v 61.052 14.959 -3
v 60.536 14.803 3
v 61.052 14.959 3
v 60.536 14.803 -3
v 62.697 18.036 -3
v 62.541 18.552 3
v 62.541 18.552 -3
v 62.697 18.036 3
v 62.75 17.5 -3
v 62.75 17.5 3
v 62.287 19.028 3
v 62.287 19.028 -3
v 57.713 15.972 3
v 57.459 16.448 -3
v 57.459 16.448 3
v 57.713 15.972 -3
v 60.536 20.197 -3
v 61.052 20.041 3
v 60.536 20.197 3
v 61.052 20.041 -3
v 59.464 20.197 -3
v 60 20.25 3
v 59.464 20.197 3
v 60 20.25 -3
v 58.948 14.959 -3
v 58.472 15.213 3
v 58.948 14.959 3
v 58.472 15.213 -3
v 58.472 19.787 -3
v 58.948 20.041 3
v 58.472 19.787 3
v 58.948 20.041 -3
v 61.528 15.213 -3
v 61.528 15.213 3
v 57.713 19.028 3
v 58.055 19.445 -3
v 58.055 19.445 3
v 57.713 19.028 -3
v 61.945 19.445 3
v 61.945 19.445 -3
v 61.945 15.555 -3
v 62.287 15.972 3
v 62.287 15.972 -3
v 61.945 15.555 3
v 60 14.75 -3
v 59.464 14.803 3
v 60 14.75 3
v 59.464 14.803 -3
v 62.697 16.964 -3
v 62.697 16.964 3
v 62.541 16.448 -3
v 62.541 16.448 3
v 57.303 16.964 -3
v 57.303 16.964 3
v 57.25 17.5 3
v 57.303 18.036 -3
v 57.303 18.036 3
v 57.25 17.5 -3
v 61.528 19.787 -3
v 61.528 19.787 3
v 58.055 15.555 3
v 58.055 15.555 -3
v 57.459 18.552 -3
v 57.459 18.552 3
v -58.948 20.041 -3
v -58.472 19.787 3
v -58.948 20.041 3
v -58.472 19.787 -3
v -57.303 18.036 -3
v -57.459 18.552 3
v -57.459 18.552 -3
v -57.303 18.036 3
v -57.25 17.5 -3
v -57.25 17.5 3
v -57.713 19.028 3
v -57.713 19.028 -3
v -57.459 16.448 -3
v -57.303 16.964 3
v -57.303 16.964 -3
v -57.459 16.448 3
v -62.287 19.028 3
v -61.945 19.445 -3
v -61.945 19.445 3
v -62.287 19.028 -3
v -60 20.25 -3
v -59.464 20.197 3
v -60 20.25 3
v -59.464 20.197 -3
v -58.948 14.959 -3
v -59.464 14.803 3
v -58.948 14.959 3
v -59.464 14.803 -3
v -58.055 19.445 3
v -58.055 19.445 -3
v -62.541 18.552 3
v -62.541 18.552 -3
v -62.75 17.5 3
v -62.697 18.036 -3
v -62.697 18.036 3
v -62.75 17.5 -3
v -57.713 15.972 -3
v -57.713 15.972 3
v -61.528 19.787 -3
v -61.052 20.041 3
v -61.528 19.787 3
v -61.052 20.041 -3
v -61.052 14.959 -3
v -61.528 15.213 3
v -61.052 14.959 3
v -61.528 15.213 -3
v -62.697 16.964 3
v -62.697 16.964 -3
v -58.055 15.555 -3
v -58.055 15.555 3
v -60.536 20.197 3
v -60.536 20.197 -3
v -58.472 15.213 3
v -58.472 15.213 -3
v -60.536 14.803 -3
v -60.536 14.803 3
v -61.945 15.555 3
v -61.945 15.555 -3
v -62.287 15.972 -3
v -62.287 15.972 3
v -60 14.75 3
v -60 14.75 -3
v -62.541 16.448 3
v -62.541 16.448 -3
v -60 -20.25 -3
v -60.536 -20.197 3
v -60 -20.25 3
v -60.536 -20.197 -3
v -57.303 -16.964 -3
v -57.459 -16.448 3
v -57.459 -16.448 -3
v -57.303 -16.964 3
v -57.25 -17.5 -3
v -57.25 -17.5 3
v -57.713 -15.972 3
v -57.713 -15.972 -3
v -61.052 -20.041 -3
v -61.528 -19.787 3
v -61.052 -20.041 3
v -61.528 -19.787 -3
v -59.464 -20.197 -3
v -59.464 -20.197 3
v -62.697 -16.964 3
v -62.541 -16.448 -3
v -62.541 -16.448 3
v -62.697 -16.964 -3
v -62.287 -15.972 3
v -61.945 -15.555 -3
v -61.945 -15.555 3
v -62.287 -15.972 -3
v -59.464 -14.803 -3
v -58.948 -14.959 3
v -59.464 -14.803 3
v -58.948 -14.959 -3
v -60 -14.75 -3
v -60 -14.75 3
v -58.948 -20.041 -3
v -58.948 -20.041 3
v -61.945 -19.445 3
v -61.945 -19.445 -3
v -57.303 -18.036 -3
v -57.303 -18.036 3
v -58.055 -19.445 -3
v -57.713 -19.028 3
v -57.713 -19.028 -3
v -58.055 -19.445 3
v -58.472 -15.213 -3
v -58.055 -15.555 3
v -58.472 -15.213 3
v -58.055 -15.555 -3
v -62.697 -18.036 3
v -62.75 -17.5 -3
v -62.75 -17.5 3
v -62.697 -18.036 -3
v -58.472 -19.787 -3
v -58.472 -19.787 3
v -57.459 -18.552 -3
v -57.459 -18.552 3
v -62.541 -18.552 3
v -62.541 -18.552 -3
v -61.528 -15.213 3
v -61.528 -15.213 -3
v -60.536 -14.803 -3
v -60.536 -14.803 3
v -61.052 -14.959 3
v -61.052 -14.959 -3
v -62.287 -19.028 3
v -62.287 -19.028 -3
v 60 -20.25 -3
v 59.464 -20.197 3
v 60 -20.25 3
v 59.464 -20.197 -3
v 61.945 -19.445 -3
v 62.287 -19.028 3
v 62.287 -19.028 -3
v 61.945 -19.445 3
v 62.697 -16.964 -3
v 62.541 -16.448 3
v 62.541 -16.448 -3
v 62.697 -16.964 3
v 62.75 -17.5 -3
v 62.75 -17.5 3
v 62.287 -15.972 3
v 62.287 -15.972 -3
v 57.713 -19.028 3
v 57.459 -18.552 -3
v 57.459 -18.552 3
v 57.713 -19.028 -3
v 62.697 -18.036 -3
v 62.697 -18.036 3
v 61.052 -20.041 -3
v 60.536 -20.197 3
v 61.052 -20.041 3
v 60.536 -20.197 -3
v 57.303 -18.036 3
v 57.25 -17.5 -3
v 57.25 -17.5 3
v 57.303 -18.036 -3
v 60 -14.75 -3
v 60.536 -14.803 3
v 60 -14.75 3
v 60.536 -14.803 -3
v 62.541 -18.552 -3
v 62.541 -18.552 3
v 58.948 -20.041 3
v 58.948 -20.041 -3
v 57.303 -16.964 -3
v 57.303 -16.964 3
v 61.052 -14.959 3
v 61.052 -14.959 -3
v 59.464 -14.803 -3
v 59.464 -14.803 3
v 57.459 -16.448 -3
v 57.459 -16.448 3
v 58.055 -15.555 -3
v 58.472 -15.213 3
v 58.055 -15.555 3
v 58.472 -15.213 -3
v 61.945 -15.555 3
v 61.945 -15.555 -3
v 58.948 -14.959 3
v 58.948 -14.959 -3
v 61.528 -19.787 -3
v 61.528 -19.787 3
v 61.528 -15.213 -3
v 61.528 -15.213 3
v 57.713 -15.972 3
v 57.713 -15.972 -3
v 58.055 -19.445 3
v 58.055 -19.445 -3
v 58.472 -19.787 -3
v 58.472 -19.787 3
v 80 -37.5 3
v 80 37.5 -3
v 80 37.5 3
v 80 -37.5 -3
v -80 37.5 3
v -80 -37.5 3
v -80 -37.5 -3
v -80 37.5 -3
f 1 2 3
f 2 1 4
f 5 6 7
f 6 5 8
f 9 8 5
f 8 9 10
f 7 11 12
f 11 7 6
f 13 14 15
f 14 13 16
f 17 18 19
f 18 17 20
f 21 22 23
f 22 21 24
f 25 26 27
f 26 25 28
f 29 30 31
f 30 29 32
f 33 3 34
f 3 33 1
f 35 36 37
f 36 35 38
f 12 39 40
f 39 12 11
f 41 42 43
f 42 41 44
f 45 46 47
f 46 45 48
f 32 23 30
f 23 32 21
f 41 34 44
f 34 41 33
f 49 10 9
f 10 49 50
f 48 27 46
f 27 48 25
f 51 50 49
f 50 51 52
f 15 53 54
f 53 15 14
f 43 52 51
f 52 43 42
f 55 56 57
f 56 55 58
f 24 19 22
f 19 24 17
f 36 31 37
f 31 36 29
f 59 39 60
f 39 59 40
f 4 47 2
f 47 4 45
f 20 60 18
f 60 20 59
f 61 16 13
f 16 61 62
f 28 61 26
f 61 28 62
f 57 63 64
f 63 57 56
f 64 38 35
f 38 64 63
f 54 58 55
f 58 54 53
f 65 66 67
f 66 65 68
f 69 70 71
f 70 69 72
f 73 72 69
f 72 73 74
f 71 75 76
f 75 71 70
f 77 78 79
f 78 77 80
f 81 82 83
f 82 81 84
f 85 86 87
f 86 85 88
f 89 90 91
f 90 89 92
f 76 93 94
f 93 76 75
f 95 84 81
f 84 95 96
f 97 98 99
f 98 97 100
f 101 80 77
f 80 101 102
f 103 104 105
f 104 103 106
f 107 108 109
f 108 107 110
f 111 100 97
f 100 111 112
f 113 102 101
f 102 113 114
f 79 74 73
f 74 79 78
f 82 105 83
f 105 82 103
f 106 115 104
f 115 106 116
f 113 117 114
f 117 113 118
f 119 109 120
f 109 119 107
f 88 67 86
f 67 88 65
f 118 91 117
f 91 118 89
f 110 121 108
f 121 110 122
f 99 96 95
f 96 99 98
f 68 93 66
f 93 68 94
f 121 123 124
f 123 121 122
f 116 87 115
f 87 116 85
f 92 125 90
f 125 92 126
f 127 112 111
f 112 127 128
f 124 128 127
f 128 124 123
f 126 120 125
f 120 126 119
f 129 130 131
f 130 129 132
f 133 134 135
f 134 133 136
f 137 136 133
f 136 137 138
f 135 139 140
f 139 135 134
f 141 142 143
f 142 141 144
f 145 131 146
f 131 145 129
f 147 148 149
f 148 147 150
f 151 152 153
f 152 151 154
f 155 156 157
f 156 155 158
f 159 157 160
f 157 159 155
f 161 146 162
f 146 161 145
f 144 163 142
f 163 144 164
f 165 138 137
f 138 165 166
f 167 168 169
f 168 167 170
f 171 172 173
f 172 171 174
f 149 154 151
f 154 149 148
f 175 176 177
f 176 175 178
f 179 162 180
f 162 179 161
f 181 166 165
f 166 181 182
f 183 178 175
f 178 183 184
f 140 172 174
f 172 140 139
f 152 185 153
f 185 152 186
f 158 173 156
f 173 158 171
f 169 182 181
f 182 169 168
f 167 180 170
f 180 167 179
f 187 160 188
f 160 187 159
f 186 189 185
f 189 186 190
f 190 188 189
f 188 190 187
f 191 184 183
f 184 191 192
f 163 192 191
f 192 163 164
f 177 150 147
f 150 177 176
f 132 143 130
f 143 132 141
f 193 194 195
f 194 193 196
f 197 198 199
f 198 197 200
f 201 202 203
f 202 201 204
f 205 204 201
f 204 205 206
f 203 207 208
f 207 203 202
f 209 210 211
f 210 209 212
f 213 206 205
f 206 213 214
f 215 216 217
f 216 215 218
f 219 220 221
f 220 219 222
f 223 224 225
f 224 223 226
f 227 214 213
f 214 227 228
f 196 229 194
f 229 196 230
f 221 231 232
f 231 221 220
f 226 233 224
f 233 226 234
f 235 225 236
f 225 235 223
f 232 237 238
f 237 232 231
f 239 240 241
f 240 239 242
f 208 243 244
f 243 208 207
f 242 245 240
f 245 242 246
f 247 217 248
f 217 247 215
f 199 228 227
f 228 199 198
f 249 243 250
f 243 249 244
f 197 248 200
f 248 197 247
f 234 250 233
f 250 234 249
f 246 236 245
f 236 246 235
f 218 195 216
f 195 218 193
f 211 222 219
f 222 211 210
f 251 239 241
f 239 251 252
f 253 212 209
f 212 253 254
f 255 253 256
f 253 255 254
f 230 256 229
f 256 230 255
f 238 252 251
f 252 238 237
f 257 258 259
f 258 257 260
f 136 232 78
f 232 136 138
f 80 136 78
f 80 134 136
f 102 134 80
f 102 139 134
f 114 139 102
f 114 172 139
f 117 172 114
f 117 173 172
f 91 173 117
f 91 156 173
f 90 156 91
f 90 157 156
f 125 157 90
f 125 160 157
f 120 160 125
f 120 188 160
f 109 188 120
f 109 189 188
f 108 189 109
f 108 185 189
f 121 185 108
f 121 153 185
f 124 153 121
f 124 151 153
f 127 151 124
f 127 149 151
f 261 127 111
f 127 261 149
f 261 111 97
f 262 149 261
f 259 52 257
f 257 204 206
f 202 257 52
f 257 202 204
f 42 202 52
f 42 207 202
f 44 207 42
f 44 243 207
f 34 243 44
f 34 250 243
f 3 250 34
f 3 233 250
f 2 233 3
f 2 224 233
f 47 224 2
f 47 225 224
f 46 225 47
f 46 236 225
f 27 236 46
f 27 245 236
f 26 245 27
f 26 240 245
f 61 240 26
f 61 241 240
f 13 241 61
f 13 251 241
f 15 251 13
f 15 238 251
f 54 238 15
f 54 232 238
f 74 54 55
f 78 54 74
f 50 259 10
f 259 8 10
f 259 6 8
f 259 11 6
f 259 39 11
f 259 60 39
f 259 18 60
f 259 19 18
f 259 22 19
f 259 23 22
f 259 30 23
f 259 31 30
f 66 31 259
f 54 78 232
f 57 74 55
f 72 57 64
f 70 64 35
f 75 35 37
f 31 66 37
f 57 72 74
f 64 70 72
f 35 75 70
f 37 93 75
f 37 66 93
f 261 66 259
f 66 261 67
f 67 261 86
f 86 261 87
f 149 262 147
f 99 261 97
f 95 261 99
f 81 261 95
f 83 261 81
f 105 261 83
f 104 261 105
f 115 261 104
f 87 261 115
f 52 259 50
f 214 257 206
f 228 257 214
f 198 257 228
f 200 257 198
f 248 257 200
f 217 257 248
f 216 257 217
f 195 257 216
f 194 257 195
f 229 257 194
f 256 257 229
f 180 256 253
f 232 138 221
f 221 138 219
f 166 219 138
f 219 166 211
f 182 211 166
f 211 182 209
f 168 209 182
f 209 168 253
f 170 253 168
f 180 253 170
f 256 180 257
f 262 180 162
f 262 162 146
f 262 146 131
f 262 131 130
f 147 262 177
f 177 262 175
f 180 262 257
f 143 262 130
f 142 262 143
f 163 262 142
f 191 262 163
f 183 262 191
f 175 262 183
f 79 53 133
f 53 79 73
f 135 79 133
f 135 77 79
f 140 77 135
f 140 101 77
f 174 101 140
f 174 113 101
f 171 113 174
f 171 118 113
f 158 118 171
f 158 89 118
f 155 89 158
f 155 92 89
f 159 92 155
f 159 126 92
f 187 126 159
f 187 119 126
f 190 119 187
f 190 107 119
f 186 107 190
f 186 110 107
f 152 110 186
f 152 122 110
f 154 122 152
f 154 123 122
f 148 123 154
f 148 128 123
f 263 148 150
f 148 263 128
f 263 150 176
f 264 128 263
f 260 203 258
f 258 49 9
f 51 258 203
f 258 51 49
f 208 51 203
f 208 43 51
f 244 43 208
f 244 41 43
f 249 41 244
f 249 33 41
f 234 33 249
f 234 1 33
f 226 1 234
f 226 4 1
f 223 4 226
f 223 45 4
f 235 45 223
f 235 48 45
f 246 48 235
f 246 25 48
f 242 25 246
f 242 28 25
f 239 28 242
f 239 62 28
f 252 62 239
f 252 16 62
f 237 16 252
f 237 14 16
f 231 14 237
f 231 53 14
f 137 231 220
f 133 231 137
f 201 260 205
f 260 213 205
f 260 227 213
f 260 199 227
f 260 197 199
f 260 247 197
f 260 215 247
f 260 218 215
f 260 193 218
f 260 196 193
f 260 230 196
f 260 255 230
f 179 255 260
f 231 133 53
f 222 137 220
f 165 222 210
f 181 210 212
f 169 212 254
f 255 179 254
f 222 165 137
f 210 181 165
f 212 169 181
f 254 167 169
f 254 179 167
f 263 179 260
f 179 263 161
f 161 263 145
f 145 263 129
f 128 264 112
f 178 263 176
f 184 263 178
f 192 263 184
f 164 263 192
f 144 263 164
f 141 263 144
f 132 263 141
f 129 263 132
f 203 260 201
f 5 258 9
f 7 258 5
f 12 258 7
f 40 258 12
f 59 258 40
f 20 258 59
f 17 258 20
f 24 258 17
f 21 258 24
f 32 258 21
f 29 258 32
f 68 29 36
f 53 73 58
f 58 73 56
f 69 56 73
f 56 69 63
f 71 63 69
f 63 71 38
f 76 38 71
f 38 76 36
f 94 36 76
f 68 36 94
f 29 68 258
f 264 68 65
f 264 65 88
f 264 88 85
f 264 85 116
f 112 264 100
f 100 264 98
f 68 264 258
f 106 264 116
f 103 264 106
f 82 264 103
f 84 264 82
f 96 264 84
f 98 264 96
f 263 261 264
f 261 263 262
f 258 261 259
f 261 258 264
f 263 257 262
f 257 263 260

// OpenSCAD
$fn = 32;

// ----------------------------------------------------------------------
// Corner plate 160 x 75 x 6
// 4 holes, centres taken from the edge offset
// ----------------------------------------------------------------------

// --- parameters (mm) ---
plate = [160, 75, 6];  // overall size (x, y, z)
holes = 4;             // number of holes the drawing asks for
hole_d = 5.5;          // hole diameter
edge = 20;             // hole centre offset from the plate edge

// --- derived feature positions (mm) ---
corner_x = plate[0] / 2 - edge;  // = 60   corner hole X
corner_y = plate[1] / 2 - edge;  // = 17.5   corner hole Y
feature_centers = [
  [corner_x, corner_y],
  [-corner_x, corner_y],
  [-corner_x, -corner_y],
  [corner_x, -corner_y]
];   // hole centres the loop below drills

// plate outline, every hole drilled through with the same cutters
difference() {
  cube(plate, center = true);
  for (centre = feature_centers)
    translate([centre[0], centre[1], 0])
      cylinder(d = hole_d, h = plate[2] + 2, center = true);
}
